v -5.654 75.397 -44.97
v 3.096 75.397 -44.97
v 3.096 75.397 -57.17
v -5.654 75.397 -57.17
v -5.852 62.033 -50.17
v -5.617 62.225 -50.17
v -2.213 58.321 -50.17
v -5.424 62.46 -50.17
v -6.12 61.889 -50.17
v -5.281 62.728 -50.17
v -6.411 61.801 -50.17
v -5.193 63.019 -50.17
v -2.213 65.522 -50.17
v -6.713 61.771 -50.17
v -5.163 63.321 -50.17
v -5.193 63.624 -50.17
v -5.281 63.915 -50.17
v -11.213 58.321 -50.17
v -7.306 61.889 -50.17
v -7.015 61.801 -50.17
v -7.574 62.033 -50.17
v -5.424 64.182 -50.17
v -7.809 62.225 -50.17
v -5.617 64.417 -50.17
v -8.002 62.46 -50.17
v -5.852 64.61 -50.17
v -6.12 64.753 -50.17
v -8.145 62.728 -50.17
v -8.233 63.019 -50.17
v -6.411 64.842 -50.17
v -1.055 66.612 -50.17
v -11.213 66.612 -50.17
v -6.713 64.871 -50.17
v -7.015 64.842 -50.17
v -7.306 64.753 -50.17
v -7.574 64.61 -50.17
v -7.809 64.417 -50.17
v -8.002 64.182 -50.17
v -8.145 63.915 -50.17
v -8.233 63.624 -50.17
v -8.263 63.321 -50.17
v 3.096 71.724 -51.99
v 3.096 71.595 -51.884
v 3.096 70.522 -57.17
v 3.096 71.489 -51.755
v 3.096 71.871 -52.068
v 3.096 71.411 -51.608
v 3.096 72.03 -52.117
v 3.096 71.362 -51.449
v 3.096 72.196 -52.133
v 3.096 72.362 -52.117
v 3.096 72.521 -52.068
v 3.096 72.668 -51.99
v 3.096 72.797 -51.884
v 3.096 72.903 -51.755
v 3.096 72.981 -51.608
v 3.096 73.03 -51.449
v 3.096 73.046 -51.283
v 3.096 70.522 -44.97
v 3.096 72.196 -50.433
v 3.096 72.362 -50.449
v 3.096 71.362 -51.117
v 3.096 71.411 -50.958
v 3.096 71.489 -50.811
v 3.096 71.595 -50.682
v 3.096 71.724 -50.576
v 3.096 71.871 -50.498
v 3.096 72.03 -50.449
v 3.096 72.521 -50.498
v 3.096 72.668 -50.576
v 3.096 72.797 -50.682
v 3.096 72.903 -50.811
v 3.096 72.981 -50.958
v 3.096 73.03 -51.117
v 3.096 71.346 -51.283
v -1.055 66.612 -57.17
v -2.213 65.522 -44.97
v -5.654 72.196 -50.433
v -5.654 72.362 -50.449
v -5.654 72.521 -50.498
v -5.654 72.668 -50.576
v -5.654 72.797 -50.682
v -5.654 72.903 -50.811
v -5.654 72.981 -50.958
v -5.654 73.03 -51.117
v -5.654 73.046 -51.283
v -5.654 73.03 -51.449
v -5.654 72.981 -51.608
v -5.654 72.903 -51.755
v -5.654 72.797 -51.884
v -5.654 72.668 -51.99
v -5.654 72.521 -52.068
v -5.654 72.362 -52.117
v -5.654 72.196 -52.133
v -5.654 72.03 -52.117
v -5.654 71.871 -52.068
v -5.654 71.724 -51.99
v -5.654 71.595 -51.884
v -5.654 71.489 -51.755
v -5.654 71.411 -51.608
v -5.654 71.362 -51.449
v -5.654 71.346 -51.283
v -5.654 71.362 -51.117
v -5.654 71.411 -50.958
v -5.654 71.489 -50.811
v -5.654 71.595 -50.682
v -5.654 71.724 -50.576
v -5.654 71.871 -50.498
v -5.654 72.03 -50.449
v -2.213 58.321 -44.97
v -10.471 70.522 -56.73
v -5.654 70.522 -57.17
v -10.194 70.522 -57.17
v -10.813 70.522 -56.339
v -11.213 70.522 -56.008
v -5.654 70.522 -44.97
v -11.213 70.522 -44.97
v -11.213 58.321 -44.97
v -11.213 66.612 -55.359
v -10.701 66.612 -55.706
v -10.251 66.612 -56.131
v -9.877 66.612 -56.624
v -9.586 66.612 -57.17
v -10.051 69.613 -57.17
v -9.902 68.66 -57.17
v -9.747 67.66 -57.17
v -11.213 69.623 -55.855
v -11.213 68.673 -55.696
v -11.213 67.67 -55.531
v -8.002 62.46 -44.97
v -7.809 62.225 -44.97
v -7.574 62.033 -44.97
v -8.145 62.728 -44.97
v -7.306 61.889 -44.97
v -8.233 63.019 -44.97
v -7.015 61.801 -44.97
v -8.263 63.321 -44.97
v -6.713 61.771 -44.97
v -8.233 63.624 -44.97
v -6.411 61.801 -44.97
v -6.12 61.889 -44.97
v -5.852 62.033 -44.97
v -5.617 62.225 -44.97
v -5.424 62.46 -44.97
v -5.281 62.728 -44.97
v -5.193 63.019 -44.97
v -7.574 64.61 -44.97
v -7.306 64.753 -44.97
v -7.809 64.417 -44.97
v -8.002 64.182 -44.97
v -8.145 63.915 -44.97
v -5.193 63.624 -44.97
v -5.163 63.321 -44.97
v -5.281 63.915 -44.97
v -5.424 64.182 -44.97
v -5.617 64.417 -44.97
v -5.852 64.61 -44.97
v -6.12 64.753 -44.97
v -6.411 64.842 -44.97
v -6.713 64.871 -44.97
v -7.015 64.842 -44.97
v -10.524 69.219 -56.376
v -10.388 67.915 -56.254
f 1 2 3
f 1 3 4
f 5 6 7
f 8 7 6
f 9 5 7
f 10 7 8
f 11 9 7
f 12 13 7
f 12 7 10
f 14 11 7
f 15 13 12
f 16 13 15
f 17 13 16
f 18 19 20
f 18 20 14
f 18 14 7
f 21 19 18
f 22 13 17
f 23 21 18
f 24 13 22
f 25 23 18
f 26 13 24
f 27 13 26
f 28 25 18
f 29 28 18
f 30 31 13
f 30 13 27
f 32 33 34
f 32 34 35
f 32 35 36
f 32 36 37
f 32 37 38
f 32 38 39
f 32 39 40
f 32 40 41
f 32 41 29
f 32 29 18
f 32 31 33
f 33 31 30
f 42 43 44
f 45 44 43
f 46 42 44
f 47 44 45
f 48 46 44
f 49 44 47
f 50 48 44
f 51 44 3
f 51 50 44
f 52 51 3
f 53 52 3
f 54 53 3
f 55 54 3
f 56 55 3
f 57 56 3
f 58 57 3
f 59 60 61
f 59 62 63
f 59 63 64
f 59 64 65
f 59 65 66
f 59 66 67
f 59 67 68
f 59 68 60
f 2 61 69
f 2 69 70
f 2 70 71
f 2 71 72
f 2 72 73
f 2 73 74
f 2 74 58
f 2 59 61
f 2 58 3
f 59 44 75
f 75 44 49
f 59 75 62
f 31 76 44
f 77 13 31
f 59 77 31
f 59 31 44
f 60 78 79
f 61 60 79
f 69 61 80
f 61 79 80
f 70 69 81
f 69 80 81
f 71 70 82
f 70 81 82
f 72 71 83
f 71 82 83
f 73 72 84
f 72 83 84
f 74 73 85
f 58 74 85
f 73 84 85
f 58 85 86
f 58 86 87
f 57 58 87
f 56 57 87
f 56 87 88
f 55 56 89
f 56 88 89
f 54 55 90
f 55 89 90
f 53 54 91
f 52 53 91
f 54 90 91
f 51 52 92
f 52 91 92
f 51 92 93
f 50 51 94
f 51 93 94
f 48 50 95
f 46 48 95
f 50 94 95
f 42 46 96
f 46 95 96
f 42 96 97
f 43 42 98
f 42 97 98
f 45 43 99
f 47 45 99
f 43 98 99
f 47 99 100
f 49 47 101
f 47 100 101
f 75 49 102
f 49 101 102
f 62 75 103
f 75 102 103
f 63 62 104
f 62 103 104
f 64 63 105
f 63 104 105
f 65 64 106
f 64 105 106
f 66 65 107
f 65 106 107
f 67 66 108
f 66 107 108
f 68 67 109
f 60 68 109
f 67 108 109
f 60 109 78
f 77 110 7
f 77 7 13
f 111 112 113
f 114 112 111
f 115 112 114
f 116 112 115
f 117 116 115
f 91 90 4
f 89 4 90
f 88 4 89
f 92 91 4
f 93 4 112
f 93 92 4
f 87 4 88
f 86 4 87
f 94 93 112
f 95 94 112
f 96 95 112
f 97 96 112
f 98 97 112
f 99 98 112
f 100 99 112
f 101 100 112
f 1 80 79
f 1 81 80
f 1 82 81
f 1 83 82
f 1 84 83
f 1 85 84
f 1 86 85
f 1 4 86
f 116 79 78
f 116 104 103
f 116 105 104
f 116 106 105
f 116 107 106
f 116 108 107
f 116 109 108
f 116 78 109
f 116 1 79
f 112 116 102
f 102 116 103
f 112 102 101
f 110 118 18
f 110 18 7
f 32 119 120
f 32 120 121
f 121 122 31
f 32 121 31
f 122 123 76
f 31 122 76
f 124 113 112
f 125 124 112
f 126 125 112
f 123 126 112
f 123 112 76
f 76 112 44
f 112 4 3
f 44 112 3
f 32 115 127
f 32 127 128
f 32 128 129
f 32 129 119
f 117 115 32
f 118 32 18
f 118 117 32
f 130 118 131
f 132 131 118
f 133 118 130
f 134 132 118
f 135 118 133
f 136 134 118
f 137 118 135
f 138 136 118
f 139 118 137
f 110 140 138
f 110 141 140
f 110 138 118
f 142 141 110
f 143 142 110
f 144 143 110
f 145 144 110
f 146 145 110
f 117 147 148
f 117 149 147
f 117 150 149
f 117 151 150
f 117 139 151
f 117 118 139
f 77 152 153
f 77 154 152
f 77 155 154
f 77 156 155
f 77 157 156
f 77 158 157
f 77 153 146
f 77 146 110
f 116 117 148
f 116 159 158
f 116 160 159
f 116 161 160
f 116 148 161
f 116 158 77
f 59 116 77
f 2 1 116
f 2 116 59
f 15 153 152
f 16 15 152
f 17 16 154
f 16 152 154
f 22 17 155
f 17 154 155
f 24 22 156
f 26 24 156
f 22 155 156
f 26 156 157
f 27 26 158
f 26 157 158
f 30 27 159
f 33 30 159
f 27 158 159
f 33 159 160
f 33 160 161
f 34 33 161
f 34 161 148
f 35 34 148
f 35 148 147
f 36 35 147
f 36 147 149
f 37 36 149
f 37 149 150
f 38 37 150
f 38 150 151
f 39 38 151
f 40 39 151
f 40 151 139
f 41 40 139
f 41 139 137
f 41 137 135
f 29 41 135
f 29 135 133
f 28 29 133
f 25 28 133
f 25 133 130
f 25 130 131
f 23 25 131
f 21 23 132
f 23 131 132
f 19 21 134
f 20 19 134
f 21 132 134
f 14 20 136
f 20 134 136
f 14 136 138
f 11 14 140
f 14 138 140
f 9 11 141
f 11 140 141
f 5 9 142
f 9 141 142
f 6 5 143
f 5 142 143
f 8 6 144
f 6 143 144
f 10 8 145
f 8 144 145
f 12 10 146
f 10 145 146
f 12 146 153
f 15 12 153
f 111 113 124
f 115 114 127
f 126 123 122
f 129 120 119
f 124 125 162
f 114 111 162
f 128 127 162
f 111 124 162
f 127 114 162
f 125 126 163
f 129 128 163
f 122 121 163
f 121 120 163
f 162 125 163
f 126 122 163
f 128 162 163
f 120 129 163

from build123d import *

# Parameters (mm, degrees)
BOSS_EXTRUDE1_DEPTH     = 12.2
SKETCH3_R               = 0.85
CUT_EXTRUDE1_DEPTH      = 8.75
CUT_EXTRUDE2_REACH      = 14.2
SKETCH4_R               = 1.55
SKETCH5_R               = 1.55
CUT_EXTRUDE3_DEPTH      = 1
CUT_EXTRUDE3_DEPTH_BACK = 7


with BuildPart() as part:
    # Sketch2 → Boss-Extrude1 (new body)
    with BuildSketch(Plane.XY.offset(-44.970352008)):
        Polygon((-11.212990891, 70.521798878), (-11.212990891, 58.321361968), (-2.212990891, 58.321361968), (-2.212990891, 65.521798878), (3.096001096, 70.521798878), (3.096001096, 75.396798878), (-5.653998904, 75.396798878), (-5.653998904, 70.521798878), align=None)
    extrude(amount=-BOSS_EXTRUDE1_DEPTH)

    # Sketch3 → Cut-Extrude1 (cut)
    with BuildSketch(Plane.ZY.offset(5.653998904)):
        with Locations((-51.282859951, 72.195892432)):
            Circle(SKETCH3_R)
    extrude(amount=-CUT_EXTRUDE1_DEPTH, mode=Mode.SUBTRACT)

    # Sketch4 → Cut-Extrude2 (cut, up to next)
    with BuildSketch(Plane.XY.offset(-44.970352008), mode=Mode.PRIVATE) as cut_extrude2_sk1:
        with Locations((-6.712990891, 63.321361968)):
            Circle(SKETCH4_R)
    cut_extrude2_tool1 = extrude(cut_extrude2_sk1.sketch, amount=-CUT_EXTRUDE2_REACH, mode=Mode.PRIVATE) & part.part
    add(cut_extrude2_tool1.solids().sort_by_distance((-6.712991, 63.321362, -44.970352))[0], mode=Mode.SUBTRACT)

    # Sketch5 → Cut-Extrude3 (cut, two sides)
    with BuildSketch(Plane(origin=(0, 0, -57.170352008), x_dir=(-1, 0, 0), z_dir=(0, 0, -1))) as cut_extrude3_sk:
        Polygon((11.212990891, 66.612258502), (1.05514261, 66.612258502), (2.212990891, 65.521798878), (2.212990891, 58.321361968), (11.212990891, 58.321361968), align=None)
        with Locations((6.712990891, 63.321361968)):
            Circle(SKETCH5_R, mode=Mode.SUBTRACT)
    extrude(amount=CUT_EXTRUDE3_DEPTH, mode=Mode.SUBTRACT)
    extrude(cut_extrude3_sk.sketch, amount=-CUT_EXTRUDE3_DEPTH_BACK, mode=Mode.SUBTRACT)

    # Sketch7 → Cut-Revolve1 (revolve, cut)
    with BuildSketch(Plane(origin=(0, 0, -58.682859951), x_dir=(-1, 0, 0), z_dir=(0, 0, -1))):
        Polygon((11.212990891, 66.612258502), (11.212990891, 70.521798878), (9.823409812, 70.521798878), (9.273959744, 66.612258502), align=None)
    revolve(axis=Axis((-13.092990891, 78.216716655, -58.682859951), (0, -1, 0)), mode=Mode.SUBTRACT)


solid = part.part
